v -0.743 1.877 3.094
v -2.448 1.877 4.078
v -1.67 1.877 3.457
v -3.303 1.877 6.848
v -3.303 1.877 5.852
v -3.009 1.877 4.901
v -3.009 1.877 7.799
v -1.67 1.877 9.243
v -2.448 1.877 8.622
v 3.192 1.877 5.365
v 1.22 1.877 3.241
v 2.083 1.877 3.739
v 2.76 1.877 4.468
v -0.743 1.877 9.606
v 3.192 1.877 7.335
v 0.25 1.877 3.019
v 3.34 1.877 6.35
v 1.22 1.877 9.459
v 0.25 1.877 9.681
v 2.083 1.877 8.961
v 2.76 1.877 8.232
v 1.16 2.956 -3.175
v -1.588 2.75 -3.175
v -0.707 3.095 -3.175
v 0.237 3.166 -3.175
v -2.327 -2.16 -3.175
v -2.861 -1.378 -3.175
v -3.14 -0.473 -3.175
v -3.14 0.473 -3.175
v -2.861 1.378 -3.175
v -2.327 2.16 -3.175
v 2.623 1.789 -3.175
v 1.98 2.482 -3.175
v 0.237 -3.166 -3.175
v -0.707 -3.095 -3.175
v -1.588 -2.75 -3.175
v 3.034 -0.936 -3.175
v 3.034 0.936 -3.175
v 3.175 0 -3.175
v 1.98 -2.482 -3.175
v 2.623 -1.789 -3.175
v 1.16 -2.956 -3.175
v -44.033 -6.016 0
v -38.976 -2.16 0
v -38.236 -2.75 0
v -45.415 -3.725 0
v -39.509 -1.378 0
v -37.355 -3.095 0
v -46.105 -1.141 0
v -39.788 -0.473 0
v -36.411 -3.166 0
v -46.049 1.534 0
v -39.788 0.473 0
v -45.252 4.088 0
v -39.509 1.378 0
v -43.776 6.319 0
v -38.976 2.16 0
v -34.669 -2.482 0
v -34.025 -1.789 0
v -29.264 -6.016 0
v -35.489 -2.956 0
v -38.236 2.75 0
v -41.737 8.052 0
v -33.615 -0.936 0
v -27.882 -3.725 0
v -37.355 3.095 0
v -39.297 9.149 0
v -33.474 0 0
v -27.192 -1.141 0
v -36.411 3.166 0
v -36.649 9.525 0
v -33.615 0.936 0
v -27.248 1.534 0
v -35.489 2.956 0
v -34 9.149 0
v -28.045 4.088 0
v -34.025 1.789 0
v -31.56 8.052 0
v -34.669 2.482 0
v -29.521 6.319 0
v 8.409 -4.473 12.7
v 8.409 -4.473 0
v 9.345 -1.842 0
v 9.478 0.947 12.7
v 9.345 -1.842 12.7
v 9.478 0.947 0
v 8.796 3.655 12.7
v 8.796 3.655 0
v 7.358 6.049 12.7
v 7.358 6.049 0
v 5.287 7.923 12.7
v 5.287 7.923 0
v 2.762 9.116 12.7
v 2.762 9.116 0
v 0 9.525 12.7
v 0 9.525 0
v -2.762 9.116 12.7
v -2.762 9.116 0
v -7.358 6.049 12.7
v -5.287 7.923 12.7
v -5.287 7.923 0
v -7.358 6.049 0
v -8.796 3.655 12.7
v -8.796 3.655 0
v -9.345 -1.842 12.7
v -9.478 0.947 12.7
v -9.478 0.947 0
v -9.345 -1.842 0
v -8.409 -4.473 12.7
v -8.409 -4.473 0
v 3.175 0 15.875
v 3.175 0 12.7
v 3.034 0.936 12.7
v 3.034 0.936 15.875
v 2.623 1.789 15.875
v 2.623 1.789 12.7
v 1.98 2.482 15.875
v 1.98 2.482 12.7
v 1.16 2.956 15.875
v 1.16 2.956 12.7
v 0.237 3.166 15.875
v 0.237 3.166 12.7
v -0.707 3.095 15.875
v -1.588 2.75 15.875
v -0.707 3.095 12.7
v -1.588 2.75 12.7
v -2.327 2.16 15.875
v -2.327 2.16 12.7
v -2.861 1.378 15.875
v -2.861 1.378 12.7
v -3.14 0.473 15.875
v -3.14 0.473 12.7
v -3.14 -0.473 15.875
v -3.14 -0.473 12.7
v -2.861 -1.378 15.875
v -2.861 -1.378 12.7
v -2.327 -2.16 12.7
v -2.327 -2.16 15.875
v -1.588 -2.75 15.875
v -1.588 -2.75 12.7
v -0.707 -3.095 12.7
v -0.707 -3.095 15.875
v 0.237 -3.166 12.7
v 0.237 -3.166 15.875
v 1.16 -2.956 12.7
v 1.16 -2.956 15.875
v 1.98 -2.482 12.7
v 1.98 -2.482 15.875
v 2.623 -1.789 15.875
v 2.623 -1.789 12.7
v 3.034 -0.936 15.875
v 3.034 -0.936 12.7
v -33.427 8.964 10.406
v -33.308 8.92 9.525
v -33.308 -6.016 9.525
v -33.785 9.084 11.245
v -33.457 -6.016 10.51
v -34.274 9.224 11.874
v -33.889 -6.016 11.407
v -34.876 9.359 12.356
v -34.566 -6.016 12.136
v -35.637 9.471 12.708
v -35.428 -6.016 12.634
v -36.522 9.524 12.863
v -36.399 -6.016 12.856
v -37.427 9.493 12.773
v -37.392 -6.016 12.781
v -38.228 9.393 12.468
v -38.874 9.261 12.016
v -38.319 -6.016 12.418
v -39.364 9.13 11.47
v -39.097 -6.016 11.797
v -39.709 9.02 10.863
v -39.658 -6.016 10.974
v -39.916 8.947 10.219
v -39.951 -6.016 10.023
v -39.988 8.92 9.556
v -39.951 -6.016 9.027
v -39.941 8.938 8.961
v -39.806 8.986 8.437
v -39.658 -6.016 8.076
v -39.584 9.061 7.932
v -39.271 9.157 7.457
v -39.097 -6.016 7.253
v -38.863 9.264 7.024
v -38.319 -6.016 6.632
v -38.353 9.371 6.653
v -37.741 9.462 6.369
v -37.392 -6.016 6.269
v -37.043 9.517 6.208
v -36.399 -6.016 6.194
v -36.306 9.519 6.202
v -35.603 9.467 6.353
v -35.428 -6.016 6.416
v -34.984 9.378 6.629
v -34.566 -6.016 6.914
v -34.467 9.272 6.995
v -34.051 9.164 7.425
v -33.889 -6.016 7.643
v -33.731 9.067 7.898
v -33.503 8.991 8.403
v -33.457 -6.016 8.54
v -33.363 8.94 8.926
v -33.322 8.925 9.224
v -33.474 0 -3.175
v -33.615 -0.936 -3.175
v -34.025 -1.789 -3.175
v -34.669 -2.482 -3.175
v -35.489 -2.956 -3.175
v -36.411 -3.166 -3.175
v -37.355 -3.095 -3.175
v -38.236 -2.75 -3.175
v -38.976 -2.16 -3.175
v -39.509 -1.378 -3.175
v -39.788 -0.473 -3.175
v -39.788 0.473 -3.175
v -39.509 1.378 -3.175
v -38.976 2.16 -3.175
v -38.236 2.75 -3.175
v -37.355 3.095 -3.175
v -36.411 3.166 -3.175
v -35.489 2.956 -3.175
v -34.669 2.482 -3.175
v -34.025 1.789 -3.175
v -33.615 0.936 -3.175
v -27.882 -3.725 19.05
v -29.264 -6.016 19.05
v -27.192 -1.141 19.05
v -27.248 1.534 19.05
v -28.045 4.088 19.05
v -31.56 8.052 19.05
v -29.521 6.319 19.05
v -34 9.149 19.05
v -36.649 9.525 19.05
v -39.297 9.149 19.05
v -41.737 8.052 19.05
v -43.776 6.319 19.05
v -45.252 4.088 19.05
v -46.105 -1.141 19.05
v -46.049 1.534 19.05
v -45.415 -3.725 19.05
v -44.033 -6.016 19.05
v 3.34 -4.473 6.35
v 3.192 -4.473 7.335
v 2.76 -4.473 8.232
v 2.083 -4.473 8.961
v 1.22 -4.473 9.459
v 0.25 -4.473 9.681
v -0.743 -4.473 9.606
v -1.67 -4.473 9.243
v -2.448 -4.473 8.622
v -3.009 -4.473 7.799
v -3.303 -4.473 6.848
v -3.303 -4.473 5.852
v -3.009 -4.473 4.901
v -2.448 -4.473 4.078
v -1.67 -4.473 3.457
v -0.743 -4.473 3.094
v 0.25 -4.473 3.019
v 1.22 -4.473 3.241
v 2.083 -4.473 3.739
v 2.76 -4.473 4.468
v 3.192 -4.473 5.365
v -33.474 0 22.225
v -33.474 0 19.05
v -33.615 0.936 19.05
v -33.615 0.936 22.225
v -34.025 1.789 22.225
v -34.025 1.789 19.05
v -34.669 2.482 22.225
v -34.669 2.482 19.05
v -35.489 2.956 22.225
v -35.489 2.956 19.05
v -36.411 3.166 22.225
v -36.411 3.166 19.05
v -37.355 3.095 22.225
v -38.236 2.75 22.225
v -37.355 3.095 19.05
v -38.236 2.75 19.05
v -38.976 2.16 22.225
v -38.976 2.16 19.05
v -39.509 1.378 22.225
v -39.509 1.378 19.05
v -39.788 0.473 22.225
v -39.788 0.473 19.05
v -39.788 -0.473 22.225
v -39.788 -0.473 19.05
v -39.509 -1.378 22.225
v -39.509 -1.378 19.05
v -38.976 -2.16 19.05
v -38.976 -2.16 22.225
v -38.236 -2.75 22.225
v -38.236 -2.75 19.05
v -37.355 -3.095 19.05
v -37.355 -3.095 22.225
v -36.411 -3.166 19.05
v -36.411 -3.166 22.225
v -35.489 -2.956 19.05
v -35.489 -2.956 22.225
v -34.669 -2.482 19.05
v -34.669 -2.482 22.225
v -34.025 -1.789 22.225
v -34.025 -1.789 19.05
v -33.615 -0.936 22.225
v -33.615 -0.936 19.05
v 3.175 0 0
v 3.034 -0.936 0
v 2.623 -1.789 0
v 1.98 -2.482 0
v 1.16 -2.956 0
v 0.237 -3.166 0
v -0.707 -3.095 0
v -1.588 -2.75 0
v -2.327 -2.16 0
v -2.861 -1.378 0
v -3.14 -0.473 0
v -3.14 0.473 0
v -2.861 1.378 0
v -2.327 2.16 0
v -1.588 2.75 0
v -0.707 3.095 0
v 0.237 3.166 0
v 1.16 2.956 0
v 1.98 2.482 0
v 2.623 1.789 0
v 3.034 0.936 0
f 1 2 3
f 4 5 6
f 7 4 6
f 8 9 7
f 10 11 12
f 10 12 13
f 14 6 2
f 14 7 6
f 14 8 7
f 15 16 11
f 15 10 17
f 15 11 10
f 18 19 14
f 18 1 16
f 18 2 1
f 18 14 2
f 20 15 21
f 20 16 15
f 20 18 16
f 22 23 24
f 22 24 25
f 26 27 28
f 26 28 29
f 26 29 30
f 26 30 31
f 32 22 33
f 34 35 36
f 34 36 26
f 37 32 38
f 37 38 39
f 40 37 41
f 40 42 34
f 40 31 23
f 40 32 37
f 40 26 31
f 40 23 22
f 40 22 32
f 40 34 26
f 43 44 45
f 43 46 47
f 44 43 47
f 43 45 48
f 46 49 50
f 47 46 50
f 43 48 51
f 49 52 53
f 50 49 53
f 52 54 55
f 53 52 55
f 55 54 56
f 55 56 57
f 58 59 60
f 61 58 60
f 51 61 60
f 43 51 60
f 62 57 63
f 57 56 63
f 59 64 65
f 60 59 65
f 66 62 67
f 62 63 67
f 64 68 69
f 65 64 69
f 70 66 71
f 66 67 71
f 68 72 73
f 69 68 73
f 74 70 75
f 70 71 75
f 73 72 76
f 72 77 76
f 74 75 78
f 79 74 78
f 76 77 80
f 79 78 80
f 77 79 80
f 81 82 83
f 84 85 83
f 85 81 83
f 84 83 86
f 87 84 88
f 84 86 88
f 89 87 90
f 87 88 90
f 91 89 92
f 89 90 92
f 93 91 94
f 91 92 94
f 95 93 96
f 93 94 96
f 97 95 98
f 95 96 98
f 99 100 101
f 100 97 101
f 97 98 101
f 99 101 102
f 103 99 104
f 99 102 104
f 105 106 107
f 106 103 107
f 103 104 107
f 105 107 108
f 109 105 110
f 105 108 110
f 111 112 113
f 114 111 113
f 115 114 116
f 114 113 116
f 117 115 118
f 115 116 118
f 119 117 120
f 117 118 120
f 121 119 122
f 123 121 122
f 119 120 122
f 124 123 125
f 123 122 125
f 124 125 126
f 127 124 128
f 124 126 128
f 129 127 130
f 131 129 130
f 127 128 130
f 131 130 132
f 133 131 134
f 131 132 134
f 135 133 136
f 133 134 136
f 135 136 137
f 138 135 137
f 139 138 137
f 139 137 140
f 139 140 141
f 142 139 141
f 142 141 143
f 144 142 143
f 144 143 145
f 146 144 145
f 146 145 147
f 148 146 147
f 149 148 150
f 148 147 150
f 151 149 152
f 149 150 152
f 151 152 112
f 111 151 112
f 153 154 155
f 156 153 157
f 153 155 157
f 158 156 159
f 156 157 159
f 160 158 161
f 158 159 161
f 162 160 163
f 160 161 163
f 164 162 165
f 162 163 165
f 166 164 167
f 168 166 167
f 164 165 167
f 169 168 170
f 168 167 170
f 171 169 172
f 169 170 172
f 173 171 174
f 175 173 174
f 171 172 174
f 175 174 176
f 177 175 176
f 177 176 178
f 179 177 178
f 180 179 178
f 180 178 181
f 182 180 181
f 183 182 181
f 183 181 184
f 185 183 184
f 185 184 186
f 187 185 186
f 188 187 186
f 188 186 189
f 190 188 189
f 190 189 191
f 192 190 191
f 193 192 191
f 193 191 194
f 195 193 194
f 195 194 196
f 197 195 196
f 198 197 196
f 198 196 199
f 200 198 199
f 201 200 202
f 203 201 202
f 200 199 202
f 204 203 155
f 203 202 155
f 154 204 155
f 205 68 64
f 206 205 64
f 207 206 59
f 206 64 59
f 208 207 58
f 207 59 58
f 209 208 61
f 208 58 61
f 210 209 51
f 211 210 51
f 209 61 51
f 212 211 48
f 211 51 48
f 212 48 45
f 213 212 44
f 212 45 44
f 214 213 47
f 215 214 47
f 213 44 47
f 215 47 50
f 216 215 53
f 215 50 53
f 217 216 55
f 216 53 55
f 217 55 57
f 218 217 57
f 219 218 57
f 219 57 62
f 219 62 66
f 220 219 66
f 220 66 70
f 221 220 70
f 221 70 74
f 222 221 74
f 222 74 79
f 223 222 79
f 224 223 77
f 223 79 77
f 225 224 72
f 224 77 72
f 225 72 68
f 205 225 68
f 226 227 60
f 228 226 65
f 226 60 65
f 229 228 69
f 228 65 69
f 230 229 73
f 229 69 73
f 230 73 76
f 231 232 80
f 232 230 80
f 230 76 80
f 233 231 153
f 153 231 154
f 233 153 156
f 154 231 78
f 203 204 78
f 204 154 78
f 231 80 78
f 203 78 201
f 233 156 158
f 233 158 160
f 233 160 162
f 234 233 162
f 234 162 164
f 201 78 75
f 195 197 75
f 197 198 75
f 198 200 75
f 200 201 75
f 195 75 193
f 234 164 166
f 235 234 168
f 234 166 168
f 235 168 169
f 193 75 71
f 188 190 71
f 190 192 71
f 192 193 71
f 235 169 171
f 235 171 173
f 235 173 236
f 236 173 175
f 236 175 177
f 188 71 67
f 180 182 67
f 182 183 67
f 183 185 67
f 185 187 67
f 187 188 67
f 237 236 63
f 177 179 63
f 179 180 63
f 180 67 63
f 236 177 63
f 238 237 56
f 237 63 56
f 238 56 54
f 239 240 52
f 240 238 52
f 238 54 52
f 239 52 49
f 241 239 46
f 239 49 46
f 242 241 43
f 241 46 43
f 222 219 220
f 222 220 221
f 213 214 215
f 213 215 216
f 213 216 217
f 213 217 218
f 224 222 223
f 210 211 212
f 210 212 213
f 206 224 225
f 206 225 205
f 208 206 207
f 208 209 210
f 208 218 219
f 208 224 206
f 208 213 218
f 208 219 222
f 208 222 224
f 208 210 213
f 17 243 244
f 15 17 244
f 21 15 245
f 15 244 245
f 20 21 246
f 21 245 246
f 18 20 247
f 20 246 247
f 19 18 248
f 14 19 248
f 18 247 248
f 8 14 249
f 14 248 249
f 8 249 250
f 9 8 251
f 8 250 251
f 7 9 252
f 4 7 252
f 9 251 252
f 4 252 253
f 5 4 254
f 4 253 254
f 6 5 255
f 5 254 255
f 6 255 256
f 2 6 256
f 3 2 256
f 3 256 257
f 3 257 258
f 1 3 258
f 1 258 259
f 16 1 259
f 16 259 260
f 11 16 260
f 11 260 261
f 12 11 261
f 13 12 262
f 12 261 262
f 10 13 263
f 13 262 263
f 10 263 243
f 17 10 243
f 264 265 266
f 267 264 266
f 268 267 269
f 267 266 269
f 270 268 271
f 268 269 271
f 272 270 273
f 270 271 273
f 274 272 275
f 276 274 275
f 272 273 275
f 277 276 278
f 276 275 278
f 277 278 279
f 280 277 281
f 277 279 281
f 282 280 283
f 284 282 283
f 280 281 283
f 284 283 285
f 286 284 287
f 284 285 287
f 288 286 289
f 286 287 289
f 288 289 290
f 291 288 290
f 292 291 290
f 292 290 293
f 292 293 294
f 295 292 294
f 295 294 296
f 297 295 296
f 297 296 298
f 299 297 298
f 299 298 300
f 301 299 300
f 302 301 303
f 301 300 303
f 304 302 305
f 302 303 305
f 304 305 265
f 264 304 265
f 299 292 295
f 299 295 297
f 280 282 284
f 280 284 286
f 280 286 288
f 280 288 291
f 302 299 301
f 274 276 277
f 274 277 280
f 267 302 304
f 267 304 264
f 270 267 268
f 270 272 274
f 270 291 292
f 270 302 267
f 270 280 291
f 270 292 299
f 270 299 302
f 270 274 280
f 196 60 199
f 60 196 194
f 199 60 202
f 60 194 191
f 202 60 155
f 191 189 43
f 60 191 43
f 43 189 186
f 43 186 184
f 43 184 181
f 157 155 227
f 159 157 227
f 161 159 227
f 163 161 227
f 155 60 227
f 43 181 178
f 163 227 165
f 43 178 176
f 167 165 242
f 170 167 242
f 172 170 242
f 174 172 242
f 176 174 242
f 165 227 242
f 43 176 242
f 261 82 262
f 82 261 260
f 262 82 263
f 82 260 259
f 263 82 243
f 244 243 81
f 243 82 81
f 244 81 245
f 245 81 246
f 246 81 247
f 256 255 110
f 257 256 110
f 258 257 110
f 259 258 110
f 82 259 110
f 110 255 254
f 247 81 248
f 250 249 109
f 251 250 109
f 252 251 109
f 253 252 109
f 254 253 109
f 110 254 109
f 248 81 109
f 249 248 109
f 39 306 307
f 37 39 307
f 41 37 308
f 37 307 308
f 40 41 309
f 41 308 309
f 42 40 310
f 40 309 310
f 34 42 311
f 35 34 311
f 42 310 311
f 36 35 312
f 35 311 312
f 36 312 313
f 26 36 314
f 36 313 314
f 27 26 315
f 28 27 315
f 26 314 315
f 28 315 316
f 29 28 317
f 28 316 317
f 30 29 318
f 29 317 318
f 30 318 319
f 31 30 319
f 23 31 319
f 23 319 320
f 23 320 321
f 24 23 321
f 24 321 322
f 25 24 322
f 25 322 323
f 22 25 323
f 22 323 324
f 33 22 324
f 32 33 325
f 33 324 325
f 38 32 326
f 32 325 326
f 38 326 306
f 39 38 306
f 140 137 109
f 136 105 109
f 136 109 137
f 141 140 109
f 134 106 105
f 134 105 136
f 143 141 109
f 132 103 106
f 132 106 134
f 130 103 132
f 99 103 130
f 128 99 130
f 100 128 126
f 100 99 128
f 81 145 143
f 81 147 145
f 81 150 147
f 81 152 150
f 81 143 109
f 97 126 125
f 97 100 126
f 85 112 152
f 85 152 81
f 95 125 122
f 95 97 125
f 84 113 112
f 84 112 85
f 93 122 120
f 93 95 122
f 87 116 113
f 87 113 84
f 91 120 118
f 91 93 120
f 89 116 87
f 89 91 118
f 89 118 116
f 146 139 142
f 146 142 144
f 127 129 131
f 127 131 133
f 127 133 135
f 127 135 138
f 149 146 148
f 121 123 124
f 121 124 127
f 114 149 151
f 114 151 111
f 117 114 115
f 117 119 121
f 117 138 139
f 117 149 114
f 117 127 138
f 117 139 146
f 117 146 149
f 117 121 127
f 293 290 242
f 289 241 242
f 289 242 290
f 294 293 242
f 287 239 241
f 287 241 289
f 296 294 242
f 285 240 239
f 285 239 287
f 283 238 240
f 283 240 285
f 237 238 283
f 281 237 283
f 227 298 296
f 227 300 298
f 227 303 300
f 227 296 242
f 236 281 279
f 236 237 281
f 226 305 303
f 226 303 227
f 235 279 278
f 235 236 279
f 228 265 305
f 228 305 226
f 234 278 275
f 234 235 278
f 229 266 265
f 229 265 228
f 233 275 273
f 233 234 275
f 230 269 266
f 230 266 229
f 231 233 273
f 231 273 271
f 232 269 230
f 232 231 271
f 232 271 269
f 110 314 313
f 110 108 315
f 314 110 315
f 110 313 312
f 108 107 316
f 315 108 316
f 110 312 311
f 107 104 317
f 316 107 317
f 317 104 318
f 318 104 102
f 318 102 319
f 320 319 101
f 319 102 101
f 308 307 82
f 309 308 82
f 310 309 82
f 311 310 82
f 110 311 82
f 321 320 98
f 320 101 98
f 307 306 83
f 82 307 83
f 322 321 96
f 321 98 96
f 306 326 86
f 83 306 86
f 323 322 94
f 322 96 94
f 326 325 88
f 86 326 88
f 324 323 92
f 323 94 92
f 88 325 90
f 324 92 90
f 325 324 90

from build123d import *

# Parameters (mm, degrees)
F0_R      = 9.525
F1_DEPTH  = 12.7
F2_R      = 3.175
F3_DEPTH  = 3.175
F4_R      = 3.175
F5_DEPTH  = 3.175
F6_R      = 9.525
F7_DEPTH  = 19.05
F9_R      = 3.175
F10_DEPTH = 3.175
F8_R      = 3.175
F11_DEPTH = 3.175
F13_DEPTH = 12.7
F14_R     = 3.3401
F15_DEPTH = 6.35
F17_DEPTH = 19.05
F18_R     = 3.3401
F19_DEPTH = 25.4


with BuildPart() as f1:
    # F0 (on Top) → F1 (new body)
    with BuildSketch(Plane.XY):
        Circle(F0_R)
    extrude(amount=F1_DEPTH)

    # F2 (on face) → F3 (join)
    with BuildSketch(Plane.XY.offset(12.7)):
        Circle(F2_R)
    extrude(amount=F3_DEPTH)

    # F4 (on face) → F5 (join)
    with BuildSketch(Plane(origin=(0, 0, 0), x_dir=(1, 0, 0), z_dir=(0, 0, -1))):
        Circle(F4_R)
    extrude(amount=F5_DEPTH)

    # F12 (on face) → F13 (cut)
    with BuildSketch(Plane.XY.offset(12.7)):
        with BuildLine():
            Line((8.4092480125, -4.4732731713), (-8.4092480125, -4.4732731713))
            ThreePointArc((-8.4092480125, -4.4732731713), (0, -9.525), (8.4092480125, -4.4732731713))
        make_face()
    extrude(amount=-F13_DEPTH, mode=Mode.SUBTRACT)

    # F14 (on face) → F15 (cut)
    with BuildSketch(Plane.XZ.offset(4.4732731713)):
        with Locations((0, 6.35)):
            Circle(F14_R)
    extrude(amount=-F15_DEPTH, mode=Mode.SUBTRACT)


with BuildPart() as f7:
    # F6 (on Top) → F7 (new body)
    with BuildSketch(Plane.XY):
        with Locations((-36.6485081613, 0)):
            Circle(F6_R)
    extrude(amount=F7_DEPTH)

    # F9 (on face) → F10 (join)
    with BuildSketch(Plane(origin=(0, 0, 0), x_dir=(1, 0, 0), z_dir=(0, 0, -1))):
        with Locations((-36.6485081613, 0)):
            Circle(F9_R)
    extrude(amount=F10_DEPTH)

    # F8 (on face) → F11 (join)
    with BuildSketch(Plane.XY.offset(19.05)):
        with Locations((-36.6485081613, 0)):
            Circle(F8_R)
    extrude(amount=F11_DEPTH)

    # F16 (on face) → F17 (cut)
    with BuildSketch(Plane.XY.offset(19.05)):
        with BuildLine():
            Line((-29.2640777834, -6.0162956205), (-44.0329385393, -6.0162956205))
            ThreePointArc((-44.0329385393, -6.0162956205), (-36.6485081613, -9.525), (-29.2640777834, -6.0162956205))
        make_face()
    extrude(amount=-F17_DEPTH, mode=Mode.SUBTRACT)

    # F18 (on face) → F19 (cut)
    with BuildSketch(Plane.XZ.offset(6.0162956205)):
        with Locations((-36.6485081613, 9.525)):
            Circle(F18_R)
    extrude(amount=-F19_DEPTH, mode=Mode.SUBTRACT)


solid = Compound([f1.part, f7.part])
